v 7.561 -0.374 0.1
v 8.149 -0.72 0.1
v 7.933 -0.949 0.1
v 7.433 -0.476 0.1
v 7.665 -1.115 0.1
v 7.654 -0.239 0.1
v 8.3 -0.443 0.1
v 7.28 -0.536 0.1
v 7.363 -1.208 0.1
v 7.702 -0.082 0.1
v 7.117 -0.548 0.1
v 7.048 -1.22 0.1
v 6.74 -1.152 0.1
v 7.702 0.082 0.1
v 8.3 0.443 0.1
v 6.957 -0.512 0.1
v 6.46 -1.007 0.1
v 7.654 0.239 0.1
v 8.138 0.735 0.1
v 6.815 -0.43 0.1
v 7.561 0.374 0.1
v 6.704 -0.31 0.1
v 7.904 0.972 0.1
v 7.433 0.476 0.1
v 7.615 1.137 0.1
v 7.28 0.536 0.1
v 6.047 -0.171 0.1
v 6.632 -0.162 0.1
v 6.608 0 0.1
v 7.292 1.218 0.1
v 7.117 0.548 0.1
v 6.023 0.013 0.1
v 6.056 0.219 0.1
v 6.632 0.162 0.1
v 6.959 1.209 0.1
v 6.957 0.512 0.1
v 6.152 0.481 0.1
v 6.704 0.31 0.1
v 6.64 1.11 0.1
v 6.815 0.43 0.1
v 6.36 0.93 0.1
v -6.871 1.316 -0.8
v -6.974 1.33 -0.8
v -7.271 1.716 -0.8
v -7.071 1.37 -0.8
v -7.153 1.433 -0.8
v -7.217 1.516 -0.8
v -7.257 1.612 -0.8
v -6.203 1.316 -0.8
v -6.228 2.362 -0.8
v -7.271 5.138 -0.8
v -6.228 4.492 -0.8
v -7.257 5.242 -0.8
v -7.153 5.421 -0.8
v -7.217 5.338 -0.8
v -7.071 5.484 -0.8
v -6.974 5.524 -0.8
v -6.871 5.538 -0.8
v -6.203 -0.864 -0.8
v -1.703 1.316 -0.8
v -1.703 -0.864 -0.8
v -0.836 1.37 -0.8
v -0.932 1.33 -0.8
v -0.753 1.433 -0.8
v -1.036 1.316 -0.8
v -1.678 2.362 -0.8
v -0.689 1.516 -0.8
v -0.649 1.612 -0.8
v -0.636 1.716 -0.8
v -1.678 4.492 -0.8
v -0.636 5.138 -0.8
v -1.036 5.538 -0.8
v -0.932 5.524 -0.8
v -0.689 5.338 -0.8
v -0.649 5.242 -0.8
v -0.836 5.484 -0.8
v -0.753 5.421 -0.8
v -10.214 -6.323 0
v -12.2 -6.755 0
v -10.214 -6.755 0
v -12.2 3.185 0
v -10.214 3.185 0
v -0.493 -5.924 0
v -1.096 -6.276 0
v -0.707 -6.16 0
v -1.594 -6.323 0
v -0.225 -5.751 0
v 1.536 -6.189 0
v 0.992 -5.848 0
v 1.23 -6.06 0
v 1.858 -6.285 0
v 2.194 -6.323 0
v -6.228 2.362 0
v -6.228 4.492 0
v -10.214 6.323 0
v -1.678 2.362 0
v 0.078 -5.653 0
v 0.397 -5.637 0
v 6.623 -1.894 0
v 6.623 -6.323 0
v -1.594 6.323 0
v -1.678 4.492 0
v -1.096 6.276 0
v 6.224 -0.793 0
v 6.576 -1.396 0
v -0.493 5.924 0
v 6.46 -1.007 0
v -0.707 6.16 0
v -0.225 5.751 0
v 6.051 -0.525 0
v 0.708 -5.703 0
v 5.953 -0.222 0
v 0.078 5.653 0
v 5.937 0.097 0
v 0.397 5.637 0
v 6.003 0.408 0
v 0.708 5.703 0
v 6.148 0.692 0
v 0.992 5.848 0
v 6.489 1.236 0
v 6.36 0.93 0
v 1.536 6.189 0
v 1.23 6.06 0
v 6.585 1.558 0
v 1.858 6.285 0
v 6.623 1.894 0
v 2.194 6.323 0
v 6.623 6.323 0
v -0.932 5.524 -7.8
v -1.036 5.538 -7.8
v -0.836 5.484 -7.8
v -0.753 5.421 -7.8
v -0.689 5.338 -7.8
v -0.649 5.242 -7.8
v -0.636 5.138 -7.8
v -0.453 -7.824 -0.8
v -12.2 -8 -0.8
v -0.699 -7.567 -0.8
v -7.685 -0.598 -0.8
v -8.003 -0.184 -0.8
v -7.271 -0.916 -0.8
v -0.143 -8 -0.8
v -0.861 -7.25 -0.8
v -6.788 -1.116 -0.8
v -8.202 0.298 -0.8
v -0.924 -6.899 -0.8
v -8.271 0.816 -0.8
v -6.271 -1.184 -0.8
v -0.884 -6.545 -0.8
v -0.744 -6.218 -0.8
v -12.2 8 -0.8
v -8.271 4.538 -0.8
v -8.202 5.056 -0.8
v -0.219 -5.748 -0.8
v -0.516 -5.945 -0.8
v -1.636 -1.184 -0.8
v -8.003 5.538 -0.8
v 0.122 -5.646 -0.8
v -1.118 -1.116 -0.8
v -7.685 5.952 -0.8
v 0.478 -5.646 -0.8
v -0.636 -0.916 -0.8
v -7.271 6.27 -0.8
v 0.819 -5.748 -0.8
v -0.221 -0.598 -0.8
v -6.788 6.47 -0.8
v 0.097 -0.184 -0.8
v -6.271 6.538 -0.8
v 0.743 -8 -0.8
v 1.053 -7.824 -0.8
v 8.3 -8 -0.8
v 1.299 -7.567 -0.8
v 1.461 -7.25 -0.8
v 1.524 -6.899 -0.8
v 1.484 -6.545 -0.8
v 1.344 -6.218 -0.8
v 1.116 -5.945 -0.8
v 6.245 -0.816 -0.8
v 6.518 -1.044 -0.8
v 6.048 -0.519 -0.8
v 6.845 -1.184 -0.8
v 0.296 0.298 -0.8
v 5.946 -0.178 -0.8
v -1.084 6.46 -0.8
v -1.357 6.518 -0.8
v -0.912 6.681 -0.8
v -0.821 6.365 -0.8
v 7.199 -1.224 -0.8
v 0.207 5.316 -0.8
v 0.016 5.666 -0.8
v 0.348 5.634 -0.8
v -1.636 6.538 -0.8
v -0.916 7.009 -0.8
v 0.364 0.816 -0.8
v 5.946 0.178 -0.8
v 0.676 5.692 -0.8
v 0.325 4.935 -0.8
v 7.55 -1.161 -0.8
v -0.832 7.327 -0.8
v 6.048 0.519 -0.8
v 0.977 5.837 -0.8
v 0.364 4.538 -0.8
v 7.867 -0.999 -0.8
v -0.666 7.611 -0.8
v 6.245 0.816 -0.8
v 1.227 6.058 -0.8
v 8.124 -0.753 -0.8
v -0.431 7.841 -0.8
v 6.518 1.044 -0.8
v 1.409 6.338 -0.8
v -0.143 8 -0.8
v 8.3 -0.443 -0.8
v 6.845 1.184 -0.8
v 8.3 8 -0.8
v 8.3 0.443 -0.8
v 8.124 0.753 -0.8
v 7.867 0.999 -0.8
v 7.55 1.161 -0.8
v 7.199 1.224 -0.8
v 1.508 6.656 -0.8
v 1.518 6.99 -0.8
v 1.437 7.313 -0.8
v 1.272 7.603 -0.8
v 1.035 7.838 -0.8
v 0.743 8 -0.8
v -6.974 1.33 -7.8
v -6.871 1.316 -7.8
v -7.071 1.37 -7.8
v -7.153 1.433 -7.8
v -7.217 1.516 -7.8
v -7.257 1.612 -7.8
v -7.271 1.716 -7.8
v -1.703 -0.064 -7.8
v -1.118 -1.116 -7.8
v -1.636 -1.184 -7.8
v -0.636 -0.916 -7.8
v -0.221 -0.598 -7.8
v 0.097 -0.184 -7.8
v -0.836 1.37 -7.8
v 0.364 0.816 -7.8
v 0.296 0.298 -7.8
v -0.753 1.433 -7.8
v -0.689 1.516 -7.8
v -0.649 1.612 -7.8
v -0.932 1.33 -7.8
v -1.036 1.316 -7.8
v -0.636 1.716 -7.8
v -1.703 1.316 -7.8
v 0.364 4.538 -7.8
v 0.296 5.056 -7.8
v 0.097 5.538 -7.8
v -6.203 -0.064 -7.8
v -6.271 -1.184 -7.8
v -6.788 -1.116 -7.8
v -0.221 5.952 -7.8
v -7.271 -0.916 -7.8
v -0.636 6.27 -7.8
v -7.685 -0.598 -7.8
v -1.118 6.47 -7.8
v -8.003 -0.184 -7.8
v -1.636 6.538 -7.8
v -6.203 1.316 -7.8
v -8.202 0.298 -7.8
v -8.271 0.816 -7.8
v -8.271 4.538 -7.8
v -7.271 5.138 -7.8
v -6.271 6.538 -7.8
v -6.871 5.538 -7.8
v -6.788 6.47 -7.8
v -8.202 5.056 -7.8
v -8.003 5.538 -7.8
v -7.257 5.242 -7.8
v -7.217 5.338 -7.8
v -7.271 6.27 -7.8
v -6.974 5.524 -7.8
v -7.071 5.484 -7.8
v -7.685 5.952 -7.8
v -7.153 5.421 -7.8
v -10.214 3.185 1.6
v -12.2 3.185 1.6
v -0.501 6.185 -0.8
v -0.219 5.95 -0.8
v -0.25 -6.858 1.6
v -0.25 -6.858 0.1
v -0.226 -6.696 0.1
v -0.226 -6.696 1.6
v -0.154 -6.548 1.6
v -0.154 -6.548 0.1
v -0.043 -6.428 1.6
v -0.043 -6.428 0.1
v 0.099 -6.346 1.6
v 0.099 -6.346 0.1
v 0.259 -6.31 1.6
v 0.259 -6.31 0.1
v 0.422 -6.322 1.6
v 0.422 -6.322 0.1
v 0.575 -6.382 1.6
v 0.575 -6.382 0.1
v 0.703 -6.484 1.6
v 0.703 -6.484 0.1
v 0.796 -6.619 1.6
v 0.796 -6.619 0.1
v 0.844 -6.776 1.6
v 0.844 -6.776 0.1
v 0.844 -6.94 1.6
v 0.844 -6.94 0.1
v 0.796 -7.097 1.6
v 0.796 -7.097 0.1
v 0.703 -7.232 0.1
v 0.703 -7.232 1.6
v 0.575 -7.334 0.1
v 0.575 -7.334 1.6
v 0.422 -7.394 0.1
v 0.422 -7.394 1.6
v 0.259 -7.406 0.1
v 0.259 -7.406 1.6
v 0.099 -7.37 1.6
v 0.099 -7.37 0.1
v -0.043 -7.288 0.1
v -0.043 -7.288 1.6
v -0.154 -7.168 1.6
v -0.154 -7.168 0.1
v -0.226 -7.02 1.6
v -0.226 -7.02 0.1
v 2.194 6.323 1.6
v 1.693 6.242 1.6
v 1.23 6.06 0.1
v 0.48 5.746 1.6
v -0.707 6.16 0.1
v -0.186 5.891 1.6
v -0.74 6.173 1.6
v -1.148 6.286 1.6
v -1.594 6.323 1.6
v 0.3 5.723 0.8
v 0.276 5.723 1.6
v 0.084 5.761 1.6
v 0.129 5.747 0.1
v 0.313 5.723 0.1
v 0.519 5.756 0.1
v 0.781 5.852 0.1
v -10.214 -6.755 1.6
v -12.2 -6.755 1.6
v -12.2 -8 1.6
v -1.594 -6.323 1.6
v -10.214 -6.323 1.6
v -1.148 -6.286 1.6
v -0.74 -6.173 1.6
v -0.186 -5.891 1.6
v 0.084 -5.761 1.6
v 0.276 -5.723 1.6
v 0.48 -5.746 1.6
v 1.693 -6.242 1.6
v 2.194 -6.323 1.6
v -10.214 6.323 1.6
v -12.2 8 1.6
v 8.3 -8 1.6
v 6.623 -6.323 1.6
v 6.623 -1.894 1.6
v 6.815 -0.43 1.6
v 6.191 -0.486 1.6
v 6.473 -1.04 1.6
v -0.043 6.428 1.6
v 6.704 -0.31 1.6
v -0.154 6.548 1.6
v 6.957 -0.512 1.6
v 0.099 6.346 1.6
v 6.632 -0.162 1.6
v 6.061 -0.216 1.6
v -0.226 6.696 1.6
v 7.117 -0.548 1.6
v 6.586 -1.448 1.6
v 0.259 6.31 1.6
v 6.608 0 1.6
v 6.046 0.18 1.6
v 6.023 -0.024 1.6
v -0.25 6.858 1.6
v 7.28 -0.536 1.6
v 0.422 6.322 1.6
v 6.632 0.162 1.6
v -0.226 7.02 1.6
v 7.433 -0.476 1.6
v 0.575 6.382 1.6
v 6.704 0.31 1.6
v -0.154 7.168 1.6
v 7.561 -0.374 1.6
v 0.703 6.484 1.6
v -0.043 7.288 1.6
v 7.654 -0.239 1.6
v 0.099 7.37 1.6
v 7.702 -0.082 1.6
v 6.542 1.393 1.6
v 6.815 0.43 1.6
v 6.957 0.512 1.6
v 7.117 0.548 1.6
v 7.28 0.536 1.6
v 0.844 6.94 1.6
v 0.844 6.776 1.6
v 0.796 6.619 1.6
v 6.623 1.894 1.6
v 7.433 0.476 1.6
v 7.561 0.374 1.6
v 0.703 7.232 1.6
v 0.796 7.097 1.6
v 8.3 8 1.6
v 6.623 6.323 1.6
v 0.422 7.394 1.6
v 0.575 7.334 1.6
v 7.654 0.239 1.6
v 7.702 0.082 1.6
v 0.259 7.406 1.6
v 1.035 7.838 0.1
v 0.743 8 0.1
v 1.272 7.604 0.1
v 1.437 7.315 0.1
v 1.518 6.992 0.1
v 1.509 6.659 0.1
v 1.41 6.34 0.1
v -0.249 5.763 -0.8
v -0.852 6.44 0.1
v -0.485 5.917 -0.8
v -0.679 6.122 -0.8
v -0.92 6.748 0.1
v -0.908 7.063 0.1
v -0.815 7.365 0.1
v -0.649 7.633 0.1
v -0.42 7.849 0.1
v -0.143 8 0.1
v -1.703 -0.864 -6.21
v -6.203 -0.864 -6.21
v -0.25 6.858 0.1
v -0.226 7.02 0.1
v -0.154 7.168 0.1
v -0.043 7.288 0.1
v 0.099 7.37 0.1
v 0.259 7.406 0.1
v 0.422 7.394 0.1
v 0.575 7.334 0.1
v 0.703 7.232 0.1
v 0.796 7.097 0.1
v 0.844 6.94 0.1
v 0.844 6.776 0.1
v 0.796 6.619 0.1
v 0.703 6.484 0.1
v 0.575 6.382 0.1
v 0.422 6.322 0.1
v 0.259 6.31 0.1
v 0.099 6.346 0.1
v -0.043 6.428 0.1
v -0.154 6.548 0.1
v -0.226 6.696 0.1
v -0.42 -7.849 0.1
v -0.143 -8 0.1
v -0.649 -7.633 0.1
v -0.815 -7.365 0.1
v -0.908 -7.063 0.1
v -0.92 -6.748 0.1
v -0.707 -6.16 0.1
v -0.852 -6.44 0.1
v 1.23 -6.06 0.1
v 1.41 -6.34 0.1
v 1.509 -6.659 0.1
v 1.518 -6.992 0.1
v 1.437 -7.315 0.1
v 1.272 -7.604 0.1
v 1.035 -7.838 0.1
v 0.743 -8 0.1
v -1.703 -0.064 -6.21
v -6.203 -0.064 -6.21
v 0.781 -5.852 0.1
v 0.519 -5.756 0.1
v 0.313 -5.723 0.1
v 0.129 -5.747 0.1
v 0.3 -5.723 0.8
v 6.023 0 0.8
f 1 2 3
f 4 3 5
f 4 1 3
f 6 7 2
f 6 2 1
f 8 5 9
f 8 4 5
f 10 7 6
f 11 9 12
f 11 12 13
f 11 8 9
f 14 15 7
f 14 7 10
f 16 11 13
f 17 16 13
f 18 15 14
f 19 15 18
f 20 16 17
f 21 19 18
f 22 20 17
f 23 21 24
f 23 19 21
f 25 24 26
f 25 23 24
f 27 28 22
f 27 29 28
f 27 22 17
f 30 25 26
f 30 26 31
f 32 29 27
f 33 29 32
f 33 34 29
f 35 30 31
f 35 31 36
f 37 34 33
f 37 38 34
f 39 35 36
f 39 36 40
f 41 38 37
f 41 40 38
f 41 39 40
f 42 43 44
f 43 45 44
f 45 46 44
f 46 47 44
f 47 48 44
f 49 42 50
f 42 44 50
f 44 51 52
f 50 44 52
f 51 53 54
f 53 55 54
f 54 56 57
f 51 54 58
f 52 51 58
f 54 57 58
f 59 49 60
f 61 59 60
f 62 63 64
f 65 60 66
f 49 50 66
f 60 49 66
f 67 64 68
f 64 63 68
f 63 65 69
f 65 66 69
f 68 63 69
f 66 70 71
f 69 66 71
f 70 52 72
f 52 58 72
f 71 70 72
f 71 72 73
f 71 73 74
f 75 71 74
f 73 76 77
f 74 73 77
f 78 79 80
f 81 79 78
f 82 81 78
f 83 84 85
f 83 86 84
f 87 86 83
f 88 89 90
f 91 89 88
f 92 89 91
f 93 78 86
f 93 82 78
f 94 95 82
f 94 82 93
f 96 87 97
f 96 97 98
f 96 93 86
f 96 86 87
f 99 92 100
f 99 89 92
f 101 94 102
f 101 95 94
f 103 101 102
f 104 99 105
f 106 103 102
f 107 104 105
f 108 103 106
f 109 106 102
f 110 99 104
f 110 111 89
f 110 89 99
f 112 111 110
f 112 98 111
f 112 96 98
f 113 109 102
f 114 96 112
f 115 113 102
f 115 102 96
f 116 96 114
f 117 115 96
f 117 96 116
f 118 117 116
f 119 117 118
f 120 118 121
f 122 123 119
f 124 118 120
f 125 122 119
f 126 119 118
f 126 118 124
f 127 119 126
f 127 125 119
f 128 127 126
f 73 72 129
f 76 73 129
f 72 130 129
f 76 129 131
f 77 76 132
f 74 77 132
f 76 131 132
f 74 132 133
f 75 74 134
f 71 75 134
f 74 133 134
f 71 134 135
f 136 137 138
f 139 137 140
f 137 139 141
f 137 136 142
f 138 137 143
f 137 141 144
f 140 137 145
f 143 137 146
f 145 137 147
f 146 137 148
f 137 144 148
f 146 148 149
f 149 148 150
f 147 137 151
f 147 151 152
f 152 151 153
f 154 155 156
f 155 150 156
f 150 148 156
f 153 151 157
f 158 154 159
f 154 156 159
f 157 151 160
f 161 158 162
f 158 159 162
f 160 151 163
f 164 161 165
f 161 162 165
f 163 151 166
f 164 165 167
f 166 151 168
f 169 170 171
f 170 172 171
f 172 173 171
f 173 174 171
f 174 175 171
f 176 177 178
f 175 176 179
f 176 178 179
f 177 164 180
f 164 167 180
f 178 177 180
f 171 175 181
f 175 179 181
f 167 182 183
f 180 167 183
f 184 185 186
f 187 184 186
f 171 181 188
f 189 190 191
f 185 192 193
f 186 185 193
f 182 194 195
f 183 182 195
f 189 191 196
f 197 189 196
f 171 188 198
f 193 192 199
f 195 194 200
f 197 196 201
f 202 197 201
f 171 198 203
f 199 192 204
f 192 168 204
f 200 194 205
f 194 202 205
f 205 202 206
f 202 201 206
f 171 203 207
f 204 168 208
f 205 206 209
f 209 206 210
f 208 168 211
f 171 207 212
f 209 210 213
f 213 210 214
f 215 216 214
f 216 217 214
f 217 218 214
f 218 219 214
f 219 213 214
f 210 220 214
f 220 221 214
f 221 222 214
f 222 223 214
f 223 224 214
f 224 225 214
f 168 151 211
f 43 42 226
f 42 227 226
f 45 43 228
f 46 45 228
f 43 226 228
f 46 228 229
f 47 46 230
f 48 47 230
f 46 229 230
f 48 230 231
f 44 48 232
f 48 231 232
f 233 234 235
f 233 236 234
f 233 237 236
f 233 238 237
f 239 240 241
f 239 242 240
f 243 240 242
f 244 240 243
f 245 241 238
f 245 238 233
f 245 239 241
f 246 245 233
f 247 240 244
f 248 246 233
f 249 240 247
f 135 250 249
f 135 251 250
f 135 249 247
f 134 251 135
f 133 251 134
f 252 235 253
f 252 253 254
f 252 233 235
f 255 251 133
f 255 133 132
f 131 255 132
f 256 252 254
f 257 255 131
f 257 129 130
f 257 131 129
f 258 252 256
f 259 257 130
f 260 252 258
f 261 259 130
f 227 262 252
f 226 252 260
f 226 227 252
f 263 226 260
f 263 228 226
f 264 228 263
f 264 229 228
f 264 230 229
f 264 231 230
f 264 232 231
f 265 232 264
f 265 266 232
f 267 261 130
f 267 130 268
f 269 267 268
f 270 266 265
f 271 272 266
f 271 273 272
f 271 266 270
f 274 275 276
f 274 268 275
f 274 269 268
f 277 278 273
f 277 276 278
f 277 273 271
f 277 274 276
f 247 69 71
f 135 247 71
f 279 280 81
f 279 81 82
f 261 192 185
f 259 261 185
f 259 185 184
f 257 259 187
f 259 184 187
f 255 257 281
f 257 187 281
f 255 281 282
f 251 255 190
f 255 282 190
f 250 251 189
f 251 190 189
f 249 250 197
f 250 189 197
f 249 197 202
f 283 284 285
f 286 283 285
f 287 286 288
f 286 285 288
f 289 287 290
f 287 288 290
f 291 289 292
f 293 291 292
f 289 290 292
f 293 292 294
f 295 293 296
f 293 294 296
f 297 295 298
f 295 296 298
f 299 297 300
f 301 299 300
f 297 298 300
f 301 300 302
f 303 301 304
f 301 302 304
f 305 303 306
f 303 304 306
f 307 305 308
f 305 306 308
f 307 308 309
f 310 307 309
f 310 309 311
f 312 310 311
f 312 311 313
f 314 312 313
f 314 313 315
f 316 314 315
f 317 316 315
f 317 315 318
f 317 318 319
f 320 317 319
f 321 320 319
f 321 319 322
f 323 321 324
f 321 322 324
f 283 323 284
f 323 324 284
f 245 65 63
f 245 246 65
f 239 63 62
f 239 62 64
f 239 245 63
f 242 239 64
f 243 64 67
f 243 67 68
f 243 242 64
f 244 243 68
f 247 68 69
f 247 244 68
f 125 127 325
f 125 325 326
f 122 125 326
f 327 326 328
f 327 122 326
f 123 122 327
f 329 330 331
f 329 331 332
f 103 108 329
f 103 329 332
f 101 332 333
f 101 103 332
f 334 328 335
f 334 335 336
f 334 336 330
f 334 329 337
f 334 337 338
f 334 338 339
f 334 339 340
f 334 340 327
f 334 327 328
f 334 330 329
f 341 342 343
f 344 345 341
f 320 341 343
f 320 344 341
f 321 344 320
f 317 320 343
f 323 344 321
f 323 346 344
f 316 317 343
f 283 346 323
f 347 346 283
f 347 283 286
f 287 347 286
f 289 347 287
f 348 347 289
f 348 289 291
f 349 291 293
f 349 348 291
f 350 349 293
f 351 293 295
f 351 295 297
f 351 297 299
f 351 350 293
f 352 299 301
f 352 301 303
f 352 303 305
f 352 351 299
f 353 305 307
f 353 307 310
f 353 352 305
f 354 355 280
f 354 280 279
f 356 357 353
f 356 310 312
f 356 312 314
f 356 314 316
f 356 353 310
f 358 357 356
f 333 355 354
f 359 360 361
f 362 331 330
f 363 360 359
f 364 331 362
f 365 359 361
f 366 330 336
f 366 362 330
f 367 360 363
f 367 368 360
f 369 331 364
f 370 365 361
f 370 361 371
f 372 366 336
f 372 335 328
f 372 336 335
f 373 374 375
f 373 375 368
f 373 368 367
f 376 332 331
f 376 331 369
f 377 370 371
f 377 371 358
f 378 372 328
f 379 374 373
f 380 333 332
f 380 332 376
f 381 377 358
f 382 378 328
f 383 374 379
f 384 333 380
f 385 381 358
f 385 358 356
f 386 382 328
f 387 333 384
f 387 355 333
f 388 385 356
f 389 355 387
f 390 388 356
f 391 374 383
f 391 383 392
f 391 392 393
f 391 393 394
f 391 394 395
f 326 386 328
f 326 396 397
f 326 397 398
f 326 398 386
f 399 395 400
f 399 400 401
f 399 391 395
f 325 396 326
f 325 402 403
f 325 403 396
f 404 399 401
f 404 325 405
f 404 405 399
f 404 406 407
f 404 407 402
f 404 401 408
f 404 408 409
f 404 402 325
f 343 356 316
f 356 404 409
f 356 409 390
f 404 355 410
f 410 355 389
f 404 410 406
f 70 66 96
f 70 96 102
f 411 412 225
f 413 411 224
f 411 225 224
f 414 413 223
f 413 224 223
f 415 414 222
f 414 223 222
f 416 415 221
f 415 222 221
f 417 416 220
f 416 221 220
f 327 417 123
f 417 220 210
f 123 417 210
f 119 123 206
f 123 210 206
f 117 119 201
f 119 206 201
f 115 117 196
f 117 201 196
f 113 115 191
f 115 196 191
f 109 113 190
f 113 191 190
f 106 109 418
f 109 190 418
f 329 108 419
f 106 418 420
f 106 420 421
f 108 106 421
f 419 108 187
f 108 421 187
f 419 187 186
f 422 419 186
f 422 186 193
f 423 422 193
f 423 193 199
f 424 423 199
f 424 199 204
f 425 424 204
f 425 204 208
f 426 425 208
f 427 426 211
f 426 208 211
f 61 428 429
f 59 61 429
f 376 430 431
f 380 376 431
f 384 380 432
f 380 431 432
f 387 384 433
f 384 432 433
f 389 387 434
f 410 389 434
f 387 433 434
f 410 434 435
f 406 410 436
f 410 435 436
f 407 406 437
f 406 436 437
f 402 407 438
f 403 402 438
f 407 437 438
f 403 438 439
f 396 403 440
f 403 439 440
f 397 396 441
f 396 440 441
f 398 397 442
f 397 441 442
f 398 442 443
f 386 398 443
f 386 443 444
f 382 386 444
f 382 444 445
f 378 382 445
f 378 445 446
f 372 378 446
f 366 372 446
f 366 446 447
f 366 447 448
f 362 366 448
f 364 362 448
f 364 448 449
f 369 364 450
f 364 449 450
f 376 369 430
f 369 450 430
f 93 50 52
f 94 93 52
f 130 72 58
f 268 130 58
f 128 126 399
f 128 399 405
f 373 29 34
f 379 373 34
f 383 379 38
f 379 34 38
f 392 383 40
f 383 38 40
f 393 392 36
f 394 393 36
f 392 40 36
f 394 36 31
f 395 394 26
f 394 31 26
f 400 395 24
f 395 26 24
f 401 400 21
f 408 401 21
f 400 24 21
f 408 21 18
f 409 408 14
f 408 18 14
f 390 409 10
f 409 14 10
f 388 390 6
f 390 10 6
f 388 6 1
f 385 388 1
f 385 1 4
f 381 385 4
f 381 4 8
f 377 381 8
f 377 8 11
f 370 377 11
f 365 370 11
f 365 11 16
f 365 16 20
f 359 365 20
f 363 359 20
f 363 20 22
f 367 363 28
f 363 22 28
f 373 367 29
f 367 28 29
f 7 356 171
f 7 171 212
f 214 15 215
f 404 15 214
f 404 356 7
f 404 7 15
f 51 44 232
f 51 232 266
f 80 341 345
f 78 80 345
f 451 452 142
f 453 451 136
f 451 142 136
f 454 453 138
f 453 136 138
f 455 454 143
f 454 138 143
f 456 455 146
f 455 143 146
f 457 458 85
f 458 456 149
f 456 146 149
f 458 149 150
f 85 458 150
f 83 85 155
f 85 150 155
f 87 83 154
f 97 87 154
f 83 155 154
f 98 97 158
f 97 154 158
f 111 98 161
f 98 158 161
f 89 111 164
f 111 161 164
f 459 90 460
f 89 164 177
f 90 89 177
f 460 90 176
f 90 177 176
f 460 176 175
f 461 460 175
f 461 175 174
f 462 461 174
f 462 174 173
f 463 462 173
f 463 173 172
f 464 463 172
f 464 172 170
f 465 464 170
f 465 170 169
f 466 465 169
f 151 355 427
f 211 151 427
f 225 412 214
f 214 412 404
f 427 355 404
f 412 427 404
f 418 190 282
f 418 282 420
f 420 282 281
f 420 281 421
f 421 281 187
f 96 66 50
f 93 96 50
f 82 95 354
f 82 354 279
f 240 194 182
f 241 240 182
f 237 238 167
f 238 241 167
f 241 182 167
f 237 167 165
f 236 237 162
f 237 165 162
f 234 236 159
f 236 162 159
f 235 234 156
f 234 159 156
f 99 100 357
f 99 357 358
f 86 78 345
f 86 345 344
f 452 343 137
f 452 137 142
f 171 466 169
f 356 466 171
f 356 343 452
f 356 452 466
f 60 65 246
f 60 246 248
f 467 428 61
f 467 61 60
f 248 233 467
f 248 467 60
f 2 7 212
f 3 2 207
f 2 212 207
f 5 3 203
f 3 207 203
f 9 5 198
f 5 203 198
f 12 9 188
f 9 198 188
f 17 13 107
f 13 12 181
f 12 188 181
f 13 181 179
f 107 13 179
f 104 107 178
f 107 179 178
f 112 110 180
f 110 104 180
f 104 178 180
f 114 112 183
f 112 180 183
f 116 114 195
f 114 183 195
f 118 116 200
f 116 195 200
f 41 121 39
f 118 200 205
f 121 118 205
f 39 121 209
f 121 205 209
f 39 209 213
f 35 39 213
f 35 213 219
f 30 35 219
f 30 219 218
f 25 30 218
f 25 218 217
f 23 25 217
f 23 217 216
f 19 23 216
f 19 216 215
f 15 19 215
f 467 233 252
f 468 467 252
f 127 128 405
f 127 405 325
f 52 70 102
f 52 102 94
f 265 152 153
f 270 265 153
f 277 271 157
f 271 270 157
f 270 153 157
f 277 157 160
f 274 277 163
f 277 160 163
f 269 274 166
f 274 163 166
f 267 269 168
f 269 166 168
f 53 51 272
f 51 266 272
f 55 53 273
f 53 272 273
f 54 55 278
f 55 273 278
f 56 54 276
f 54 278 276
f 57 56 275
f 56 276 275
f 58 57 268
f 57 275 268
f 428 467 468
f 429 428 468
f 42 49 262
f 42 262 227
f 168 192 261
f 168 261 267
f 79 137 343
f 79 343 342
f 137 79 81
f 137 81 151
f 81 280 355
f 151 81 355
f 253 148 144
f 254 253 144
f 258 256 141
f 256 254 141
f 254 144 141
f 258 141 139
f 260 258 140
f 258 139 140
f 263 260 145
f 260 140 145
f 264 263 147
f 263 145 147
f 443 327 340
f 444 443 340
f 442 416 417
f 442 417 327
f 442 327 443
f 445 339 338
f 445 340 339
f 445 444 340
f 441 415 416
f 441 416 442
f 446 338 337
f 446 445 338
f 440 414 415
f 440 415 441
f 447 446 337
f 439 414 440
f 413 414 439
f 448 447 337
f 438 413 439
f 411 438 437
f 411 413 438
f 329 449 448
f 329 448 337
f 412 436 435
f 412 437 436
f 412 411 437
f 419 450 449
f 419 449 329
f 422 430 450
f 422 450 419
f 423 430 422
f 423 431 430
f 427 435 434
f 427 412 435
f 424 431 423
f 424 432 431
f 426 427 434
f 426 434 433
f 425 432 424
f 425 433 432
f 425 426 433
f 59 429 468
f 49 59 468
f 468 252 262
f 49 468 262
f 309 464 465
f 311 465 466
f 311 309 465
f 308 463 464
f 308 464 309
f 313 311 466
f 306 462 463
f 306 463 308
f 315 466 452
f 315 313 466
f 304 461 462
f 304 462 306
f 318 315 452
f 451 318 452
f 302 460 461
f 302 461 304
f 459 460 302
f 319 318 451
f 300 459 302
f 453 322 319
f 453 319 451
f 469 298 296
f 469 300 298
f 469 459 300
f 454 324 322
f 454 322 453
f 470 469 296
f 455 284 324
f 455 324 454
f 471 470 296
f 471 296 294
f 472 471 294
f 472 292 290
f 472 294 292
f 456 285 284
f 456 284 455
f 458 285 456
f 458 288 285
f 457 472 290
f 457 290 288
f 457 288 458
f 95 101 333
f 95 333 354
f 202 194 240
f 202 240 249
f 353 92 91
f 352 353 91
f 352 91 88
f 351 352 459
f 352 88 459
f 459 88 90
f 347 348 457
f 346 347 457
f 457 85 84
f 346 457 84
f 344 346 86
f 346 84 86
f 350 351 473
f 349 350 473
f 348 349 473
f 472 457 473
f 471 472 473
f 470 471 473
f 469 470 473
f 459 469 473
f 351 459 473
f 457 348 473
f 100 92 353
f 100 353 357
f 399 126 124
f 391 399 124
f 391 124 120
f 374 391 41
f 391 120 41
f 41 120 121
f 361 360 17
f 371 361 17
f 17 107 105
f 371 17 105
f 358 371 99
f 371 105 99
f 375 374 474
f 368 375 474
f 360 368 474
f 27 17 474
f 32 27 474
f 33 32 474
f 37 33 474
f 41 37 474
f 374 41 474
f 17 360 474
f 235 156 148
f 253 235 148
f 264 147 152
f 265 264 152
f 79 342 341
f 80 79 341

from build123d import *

# Parameters (mm, degrees)
SKETCH11_W          = 20.5
SKETCH11_H          = 16
BOSS_EXTRUDE4_DEPTH = 1.6
SKETCH10_W          = 20.5
SKETCH10_H          = 16
BOSS_EXTRUDE5_DEPTH = 0.8
SKETCH12_R          = 1.225
CUT_EXTRUDE1_DEPTH  = 0.9
SKETCH13_R          = 0.55
CUT_EXTRUDE2_DEPTH  = 1.5
SKETCH14_W          = 4.55
SKETCH14_H          = 2.13
CUT_EXTRUDE3_DEPTH  = 0.8
SKETCH17_W          = 1.985999923
SKETCH17_H          = 9.940122219
CUT_EXTRUDE5_DEPTH  = 1.6
SKETCH18_W          = 8.635
SKETCH18_H          = 7.722
SKETCH18_W_2        = 6.635
SKETCH18_H_2        = 4.222
BOSS_EXTRUDE6_DEPTH = 7
FILLET2_R           = 0.4
FILLET3_R           = 2
SKETCH19_W          = 4.5
SKETCH19_H          = 1.38
CUT_EXTRUDE6_DEPTH  = 7
SKETCH21_W          = 4.5
SKETCH21_H          = 0.8
CUT_EXTRUDE7_DEPTH  = 5.41


with BuildPart() as part:
    # Sketch11 → Boss-Extrude4 (new body)
    with BuildSketch(Plane.XY):
        with Locations((-1.95, 0)):
            Rectangle(SKETCH11_W, SKETCH11_H)
        with BuildLine():
            Line((6.622999053, 6.323000154), (2.19427083, 6.323000154))
            add(Edge.make_bspline(
                [(2.19427083, 6.323000154), (1.446811282, 6.323000154), (0.126304944, 5.123000154), (-0.499421171, 6.323000154), (-1.59427083, 6.323000154)],
                knots=[0, 0, 0, 0, 0.5, 1, 1, 1, 1], degree=3))
            Line((-1.59427083, 6.323000154), (-10.214000077, 6.323000154))
            Line((-10.214000077, 6.323000154), (-10.214000077, -6.323000154))
            Line((-10.214000077, -6.323000154), (-1.59427083, -6.323000154))
            add(Edge.make_bspline(
                [(2.19427083, -6.323000154), (1.446811282, -6.323000154), (0.126304944, -5.123000154), (-0.499421171, -6.323000154), (-1.59427083, -6.323000154)],
                knots=[0, 0, 0, 0, 0.5, 1, 1, 1, 1], degree=3))
            Line((2.19427083, -6.323000154), (6.622999053, -6.323000154))
            Line((6.622999053, -6.323000154), (6.622999053, -1.894271742))
            add(Edge.make_bspline(
                [(6.622999053, 1.894271742), (6.622999053, 1.146811937), (5.422999053, -0.173695015), (6.622999053, -0.799421908), (6.622999053, -1.894271742)],
                knots=[0, 0, 0, 0, 0.5, 1, 1, 1, 1], degree=3))
            Line((6.622999053, 1.894271742), (6.622999053, 6.323000154))
        make_face(mode=Mode.SUBTRACT)
    extrude(amount=BOSS_EXTRUDE4_DEPTH)

    # Sketch10 → Boss-Extrude5 (add)
    with BuildSketch(Plane.XY):
        with Locations((-1.95, 0)):
            Rectangle(SKETCH10_W, SKETCH10_H)
    extrude(amount=-BOSS_EXTRUDE5_DEPTH)

    # Sketch12 → Cut-Extrude1 (cut)
    with BuildSketch(Plane(origin=(0, 0, -0.8), x_dir=(-1, 0, 0), z_dir=(0, 0, -1))):
        with Locations((-0.3, 6.857999949)):
            Circle(SKETCH12_R)
        with Locations((-7.157999783, 0)):
            Circle(SKETCH12_R)
        with Locations((-0.3, -6.857999949)):
            Circle(SKETCH12_R)
    extrude(amount=-CUT_EXTRUDE1_DEPTH, mode=Mode.SUBTRACT)

    # Sketch13 → Cut-Extrude2 (cut)
    with BuildSketch(Plane(origin=(0, 0, 0.1), x_dir=(-1, 0, 0), z_dir=(0, 0, -1))):
        with Locations((-0.3, 6.857999949)):
            Circle(SKETCH13_R)
        with Locations((-7.157999783, 0)):
            Circle(SKETCH13_R)
        with Locations((-0.3, -6.857999949)):
            Circle(SKETCH13_R)
    extrude(amount=-CUT_EXTRUDE2_DEPTH, mode=Mode.SUBTRACT)

    # Sketch14 → Cut-Extrude3 (cut)
    with BuildSketch(Plane(origin=(0, 0, -0.8), x_dir=(-1, 0, 0), z_dir=(0, 0, -1))):
        with Locations((3.953000077, 3.426999846)):
            Rectangle(SKETCH14_W, SKETCH14_H)
    extrude(amount=-CUT_EXTRUDE3_DEPTH, mode=Mode.SUBTRACT)

    # Sketch17 → Cut-Extrude5 (cut)
    with BuildSketch(Plane.XY.offset(1.6)):
        with Locations((-11.207000039, -1.784681503)):
            Rectangle(SKETCH17_W, SKETCH17_H)
    extrude(amount=-CUT_EXTRUDE5_DEPTH, mode=Mode.SUBTRACT)

    # Sketch18 → Boss-Extrude6 (add)
    with BuildSketch(Plane(origin=(0, 0, -0.8), x_dir=(-1, 0, 0), z_dir=(0, 0, -1))):
        with Locations((3.953000077, 2.676999846)):
            Rectangle(SKETCH18_W, SKETCH18_H)
        with Locations((3.953000077, 3.426999846)):
            Rectangle(SKETCH18_W_2, SKETCH18_H_2, mode=Mode.SUBTRACT)
    extrude(amount=BOSS_EXTRUDE6_DEPTH)

    # Fillet2
    fillet2_edges = [part.edges().sort_by_distance(p)[0] for p in [
        (-0.635500077, 5.537999846, -4.3),
        (-0.635500077, 1.315999846, -4.3),
        (-7.270500077, 1.315999846, -4.3),
        (-7.270500077, 5.537999846, -4.3),
    ]]
    fillet(fillet2_edges, radius=FILLET2_R)

    # Fillet3
    # the kernel refuses this fillet: 2 mm, written as the material it takes off along each edge
    with BuildSketch(Plane(origin=(-8.270500077, 6.537999846, -0.8), x_dir=(0, -1, 0), z_dir=(0, 0, -1)), Plane(origin=(0.364499923, -1.184000154, -0.8), x_dir=(0, 1, 0), z_dir=(0, 0, -1)), Plane(origin=(-8.270500077, -1.184000154, -0.8), x_dir=(1, 0, 0), z_dir=(0, 0, -1))) as fillet3_piece_1:
        with BuildLine():
            CenterArc((FILLET3_R, -FILLET3_R), FILLET3_R, 90, 90)
            Line((0, -FILLET3_R), (0, 0))
            Line((0, 0), (FILLET3_R, 0))
        make_face()
    extrude(amount=12, mode=Mode.SUBTRACT)
    with BuildSketch(Plane(origin=(0.364499923, 6.537999846, -0.8), x_dir=(0, -1, 0), z_dir=(0, 0, -1))) as fillet3_piece_2:
        with BuildLine():
            CenterArc((FILLET3_R, FILLET3_R), FILLET3_R, 180, 90)
            Line((0, FILLET3_R), (0, 0))
            Line((0, 0), (FILLET3_R, 0))
        make_face()
    extrude(amount=12, mode=Mode.SUBTRACT)

    # Sketch19 → Cut-Extrude6 (cut)
    with BuildSketch(Plane(origin=(0, 0, -7.8), x_dir=(-1, 0, 0), z_dir=(0, 0, -1))):
        with Locations((3.953000077, 0.625999846)):
            Rectangle(SKETCH19_W, SKETCH19_H)
    extrude(amount=-CUT_EXTRUDE6_DEPTH, mode=Mode.SUBTRACT)

    # Sketch21 → Cut-Extrude7 (cut)
    with BuildSketch(Plane(origin=(0, 0, -6.21), x_dir=(-1, 0, 0), z_dir=(0, 0, -1))):
        with Locations((3.953000077, -0.464000154)):
            Rectangle(SKETCH21_W, SKETCH21_H)
    extrude(amount=-CUT_EXTRUDE7_DEPTH, mode=Mode.SUBTRACT)


solid = part.part
